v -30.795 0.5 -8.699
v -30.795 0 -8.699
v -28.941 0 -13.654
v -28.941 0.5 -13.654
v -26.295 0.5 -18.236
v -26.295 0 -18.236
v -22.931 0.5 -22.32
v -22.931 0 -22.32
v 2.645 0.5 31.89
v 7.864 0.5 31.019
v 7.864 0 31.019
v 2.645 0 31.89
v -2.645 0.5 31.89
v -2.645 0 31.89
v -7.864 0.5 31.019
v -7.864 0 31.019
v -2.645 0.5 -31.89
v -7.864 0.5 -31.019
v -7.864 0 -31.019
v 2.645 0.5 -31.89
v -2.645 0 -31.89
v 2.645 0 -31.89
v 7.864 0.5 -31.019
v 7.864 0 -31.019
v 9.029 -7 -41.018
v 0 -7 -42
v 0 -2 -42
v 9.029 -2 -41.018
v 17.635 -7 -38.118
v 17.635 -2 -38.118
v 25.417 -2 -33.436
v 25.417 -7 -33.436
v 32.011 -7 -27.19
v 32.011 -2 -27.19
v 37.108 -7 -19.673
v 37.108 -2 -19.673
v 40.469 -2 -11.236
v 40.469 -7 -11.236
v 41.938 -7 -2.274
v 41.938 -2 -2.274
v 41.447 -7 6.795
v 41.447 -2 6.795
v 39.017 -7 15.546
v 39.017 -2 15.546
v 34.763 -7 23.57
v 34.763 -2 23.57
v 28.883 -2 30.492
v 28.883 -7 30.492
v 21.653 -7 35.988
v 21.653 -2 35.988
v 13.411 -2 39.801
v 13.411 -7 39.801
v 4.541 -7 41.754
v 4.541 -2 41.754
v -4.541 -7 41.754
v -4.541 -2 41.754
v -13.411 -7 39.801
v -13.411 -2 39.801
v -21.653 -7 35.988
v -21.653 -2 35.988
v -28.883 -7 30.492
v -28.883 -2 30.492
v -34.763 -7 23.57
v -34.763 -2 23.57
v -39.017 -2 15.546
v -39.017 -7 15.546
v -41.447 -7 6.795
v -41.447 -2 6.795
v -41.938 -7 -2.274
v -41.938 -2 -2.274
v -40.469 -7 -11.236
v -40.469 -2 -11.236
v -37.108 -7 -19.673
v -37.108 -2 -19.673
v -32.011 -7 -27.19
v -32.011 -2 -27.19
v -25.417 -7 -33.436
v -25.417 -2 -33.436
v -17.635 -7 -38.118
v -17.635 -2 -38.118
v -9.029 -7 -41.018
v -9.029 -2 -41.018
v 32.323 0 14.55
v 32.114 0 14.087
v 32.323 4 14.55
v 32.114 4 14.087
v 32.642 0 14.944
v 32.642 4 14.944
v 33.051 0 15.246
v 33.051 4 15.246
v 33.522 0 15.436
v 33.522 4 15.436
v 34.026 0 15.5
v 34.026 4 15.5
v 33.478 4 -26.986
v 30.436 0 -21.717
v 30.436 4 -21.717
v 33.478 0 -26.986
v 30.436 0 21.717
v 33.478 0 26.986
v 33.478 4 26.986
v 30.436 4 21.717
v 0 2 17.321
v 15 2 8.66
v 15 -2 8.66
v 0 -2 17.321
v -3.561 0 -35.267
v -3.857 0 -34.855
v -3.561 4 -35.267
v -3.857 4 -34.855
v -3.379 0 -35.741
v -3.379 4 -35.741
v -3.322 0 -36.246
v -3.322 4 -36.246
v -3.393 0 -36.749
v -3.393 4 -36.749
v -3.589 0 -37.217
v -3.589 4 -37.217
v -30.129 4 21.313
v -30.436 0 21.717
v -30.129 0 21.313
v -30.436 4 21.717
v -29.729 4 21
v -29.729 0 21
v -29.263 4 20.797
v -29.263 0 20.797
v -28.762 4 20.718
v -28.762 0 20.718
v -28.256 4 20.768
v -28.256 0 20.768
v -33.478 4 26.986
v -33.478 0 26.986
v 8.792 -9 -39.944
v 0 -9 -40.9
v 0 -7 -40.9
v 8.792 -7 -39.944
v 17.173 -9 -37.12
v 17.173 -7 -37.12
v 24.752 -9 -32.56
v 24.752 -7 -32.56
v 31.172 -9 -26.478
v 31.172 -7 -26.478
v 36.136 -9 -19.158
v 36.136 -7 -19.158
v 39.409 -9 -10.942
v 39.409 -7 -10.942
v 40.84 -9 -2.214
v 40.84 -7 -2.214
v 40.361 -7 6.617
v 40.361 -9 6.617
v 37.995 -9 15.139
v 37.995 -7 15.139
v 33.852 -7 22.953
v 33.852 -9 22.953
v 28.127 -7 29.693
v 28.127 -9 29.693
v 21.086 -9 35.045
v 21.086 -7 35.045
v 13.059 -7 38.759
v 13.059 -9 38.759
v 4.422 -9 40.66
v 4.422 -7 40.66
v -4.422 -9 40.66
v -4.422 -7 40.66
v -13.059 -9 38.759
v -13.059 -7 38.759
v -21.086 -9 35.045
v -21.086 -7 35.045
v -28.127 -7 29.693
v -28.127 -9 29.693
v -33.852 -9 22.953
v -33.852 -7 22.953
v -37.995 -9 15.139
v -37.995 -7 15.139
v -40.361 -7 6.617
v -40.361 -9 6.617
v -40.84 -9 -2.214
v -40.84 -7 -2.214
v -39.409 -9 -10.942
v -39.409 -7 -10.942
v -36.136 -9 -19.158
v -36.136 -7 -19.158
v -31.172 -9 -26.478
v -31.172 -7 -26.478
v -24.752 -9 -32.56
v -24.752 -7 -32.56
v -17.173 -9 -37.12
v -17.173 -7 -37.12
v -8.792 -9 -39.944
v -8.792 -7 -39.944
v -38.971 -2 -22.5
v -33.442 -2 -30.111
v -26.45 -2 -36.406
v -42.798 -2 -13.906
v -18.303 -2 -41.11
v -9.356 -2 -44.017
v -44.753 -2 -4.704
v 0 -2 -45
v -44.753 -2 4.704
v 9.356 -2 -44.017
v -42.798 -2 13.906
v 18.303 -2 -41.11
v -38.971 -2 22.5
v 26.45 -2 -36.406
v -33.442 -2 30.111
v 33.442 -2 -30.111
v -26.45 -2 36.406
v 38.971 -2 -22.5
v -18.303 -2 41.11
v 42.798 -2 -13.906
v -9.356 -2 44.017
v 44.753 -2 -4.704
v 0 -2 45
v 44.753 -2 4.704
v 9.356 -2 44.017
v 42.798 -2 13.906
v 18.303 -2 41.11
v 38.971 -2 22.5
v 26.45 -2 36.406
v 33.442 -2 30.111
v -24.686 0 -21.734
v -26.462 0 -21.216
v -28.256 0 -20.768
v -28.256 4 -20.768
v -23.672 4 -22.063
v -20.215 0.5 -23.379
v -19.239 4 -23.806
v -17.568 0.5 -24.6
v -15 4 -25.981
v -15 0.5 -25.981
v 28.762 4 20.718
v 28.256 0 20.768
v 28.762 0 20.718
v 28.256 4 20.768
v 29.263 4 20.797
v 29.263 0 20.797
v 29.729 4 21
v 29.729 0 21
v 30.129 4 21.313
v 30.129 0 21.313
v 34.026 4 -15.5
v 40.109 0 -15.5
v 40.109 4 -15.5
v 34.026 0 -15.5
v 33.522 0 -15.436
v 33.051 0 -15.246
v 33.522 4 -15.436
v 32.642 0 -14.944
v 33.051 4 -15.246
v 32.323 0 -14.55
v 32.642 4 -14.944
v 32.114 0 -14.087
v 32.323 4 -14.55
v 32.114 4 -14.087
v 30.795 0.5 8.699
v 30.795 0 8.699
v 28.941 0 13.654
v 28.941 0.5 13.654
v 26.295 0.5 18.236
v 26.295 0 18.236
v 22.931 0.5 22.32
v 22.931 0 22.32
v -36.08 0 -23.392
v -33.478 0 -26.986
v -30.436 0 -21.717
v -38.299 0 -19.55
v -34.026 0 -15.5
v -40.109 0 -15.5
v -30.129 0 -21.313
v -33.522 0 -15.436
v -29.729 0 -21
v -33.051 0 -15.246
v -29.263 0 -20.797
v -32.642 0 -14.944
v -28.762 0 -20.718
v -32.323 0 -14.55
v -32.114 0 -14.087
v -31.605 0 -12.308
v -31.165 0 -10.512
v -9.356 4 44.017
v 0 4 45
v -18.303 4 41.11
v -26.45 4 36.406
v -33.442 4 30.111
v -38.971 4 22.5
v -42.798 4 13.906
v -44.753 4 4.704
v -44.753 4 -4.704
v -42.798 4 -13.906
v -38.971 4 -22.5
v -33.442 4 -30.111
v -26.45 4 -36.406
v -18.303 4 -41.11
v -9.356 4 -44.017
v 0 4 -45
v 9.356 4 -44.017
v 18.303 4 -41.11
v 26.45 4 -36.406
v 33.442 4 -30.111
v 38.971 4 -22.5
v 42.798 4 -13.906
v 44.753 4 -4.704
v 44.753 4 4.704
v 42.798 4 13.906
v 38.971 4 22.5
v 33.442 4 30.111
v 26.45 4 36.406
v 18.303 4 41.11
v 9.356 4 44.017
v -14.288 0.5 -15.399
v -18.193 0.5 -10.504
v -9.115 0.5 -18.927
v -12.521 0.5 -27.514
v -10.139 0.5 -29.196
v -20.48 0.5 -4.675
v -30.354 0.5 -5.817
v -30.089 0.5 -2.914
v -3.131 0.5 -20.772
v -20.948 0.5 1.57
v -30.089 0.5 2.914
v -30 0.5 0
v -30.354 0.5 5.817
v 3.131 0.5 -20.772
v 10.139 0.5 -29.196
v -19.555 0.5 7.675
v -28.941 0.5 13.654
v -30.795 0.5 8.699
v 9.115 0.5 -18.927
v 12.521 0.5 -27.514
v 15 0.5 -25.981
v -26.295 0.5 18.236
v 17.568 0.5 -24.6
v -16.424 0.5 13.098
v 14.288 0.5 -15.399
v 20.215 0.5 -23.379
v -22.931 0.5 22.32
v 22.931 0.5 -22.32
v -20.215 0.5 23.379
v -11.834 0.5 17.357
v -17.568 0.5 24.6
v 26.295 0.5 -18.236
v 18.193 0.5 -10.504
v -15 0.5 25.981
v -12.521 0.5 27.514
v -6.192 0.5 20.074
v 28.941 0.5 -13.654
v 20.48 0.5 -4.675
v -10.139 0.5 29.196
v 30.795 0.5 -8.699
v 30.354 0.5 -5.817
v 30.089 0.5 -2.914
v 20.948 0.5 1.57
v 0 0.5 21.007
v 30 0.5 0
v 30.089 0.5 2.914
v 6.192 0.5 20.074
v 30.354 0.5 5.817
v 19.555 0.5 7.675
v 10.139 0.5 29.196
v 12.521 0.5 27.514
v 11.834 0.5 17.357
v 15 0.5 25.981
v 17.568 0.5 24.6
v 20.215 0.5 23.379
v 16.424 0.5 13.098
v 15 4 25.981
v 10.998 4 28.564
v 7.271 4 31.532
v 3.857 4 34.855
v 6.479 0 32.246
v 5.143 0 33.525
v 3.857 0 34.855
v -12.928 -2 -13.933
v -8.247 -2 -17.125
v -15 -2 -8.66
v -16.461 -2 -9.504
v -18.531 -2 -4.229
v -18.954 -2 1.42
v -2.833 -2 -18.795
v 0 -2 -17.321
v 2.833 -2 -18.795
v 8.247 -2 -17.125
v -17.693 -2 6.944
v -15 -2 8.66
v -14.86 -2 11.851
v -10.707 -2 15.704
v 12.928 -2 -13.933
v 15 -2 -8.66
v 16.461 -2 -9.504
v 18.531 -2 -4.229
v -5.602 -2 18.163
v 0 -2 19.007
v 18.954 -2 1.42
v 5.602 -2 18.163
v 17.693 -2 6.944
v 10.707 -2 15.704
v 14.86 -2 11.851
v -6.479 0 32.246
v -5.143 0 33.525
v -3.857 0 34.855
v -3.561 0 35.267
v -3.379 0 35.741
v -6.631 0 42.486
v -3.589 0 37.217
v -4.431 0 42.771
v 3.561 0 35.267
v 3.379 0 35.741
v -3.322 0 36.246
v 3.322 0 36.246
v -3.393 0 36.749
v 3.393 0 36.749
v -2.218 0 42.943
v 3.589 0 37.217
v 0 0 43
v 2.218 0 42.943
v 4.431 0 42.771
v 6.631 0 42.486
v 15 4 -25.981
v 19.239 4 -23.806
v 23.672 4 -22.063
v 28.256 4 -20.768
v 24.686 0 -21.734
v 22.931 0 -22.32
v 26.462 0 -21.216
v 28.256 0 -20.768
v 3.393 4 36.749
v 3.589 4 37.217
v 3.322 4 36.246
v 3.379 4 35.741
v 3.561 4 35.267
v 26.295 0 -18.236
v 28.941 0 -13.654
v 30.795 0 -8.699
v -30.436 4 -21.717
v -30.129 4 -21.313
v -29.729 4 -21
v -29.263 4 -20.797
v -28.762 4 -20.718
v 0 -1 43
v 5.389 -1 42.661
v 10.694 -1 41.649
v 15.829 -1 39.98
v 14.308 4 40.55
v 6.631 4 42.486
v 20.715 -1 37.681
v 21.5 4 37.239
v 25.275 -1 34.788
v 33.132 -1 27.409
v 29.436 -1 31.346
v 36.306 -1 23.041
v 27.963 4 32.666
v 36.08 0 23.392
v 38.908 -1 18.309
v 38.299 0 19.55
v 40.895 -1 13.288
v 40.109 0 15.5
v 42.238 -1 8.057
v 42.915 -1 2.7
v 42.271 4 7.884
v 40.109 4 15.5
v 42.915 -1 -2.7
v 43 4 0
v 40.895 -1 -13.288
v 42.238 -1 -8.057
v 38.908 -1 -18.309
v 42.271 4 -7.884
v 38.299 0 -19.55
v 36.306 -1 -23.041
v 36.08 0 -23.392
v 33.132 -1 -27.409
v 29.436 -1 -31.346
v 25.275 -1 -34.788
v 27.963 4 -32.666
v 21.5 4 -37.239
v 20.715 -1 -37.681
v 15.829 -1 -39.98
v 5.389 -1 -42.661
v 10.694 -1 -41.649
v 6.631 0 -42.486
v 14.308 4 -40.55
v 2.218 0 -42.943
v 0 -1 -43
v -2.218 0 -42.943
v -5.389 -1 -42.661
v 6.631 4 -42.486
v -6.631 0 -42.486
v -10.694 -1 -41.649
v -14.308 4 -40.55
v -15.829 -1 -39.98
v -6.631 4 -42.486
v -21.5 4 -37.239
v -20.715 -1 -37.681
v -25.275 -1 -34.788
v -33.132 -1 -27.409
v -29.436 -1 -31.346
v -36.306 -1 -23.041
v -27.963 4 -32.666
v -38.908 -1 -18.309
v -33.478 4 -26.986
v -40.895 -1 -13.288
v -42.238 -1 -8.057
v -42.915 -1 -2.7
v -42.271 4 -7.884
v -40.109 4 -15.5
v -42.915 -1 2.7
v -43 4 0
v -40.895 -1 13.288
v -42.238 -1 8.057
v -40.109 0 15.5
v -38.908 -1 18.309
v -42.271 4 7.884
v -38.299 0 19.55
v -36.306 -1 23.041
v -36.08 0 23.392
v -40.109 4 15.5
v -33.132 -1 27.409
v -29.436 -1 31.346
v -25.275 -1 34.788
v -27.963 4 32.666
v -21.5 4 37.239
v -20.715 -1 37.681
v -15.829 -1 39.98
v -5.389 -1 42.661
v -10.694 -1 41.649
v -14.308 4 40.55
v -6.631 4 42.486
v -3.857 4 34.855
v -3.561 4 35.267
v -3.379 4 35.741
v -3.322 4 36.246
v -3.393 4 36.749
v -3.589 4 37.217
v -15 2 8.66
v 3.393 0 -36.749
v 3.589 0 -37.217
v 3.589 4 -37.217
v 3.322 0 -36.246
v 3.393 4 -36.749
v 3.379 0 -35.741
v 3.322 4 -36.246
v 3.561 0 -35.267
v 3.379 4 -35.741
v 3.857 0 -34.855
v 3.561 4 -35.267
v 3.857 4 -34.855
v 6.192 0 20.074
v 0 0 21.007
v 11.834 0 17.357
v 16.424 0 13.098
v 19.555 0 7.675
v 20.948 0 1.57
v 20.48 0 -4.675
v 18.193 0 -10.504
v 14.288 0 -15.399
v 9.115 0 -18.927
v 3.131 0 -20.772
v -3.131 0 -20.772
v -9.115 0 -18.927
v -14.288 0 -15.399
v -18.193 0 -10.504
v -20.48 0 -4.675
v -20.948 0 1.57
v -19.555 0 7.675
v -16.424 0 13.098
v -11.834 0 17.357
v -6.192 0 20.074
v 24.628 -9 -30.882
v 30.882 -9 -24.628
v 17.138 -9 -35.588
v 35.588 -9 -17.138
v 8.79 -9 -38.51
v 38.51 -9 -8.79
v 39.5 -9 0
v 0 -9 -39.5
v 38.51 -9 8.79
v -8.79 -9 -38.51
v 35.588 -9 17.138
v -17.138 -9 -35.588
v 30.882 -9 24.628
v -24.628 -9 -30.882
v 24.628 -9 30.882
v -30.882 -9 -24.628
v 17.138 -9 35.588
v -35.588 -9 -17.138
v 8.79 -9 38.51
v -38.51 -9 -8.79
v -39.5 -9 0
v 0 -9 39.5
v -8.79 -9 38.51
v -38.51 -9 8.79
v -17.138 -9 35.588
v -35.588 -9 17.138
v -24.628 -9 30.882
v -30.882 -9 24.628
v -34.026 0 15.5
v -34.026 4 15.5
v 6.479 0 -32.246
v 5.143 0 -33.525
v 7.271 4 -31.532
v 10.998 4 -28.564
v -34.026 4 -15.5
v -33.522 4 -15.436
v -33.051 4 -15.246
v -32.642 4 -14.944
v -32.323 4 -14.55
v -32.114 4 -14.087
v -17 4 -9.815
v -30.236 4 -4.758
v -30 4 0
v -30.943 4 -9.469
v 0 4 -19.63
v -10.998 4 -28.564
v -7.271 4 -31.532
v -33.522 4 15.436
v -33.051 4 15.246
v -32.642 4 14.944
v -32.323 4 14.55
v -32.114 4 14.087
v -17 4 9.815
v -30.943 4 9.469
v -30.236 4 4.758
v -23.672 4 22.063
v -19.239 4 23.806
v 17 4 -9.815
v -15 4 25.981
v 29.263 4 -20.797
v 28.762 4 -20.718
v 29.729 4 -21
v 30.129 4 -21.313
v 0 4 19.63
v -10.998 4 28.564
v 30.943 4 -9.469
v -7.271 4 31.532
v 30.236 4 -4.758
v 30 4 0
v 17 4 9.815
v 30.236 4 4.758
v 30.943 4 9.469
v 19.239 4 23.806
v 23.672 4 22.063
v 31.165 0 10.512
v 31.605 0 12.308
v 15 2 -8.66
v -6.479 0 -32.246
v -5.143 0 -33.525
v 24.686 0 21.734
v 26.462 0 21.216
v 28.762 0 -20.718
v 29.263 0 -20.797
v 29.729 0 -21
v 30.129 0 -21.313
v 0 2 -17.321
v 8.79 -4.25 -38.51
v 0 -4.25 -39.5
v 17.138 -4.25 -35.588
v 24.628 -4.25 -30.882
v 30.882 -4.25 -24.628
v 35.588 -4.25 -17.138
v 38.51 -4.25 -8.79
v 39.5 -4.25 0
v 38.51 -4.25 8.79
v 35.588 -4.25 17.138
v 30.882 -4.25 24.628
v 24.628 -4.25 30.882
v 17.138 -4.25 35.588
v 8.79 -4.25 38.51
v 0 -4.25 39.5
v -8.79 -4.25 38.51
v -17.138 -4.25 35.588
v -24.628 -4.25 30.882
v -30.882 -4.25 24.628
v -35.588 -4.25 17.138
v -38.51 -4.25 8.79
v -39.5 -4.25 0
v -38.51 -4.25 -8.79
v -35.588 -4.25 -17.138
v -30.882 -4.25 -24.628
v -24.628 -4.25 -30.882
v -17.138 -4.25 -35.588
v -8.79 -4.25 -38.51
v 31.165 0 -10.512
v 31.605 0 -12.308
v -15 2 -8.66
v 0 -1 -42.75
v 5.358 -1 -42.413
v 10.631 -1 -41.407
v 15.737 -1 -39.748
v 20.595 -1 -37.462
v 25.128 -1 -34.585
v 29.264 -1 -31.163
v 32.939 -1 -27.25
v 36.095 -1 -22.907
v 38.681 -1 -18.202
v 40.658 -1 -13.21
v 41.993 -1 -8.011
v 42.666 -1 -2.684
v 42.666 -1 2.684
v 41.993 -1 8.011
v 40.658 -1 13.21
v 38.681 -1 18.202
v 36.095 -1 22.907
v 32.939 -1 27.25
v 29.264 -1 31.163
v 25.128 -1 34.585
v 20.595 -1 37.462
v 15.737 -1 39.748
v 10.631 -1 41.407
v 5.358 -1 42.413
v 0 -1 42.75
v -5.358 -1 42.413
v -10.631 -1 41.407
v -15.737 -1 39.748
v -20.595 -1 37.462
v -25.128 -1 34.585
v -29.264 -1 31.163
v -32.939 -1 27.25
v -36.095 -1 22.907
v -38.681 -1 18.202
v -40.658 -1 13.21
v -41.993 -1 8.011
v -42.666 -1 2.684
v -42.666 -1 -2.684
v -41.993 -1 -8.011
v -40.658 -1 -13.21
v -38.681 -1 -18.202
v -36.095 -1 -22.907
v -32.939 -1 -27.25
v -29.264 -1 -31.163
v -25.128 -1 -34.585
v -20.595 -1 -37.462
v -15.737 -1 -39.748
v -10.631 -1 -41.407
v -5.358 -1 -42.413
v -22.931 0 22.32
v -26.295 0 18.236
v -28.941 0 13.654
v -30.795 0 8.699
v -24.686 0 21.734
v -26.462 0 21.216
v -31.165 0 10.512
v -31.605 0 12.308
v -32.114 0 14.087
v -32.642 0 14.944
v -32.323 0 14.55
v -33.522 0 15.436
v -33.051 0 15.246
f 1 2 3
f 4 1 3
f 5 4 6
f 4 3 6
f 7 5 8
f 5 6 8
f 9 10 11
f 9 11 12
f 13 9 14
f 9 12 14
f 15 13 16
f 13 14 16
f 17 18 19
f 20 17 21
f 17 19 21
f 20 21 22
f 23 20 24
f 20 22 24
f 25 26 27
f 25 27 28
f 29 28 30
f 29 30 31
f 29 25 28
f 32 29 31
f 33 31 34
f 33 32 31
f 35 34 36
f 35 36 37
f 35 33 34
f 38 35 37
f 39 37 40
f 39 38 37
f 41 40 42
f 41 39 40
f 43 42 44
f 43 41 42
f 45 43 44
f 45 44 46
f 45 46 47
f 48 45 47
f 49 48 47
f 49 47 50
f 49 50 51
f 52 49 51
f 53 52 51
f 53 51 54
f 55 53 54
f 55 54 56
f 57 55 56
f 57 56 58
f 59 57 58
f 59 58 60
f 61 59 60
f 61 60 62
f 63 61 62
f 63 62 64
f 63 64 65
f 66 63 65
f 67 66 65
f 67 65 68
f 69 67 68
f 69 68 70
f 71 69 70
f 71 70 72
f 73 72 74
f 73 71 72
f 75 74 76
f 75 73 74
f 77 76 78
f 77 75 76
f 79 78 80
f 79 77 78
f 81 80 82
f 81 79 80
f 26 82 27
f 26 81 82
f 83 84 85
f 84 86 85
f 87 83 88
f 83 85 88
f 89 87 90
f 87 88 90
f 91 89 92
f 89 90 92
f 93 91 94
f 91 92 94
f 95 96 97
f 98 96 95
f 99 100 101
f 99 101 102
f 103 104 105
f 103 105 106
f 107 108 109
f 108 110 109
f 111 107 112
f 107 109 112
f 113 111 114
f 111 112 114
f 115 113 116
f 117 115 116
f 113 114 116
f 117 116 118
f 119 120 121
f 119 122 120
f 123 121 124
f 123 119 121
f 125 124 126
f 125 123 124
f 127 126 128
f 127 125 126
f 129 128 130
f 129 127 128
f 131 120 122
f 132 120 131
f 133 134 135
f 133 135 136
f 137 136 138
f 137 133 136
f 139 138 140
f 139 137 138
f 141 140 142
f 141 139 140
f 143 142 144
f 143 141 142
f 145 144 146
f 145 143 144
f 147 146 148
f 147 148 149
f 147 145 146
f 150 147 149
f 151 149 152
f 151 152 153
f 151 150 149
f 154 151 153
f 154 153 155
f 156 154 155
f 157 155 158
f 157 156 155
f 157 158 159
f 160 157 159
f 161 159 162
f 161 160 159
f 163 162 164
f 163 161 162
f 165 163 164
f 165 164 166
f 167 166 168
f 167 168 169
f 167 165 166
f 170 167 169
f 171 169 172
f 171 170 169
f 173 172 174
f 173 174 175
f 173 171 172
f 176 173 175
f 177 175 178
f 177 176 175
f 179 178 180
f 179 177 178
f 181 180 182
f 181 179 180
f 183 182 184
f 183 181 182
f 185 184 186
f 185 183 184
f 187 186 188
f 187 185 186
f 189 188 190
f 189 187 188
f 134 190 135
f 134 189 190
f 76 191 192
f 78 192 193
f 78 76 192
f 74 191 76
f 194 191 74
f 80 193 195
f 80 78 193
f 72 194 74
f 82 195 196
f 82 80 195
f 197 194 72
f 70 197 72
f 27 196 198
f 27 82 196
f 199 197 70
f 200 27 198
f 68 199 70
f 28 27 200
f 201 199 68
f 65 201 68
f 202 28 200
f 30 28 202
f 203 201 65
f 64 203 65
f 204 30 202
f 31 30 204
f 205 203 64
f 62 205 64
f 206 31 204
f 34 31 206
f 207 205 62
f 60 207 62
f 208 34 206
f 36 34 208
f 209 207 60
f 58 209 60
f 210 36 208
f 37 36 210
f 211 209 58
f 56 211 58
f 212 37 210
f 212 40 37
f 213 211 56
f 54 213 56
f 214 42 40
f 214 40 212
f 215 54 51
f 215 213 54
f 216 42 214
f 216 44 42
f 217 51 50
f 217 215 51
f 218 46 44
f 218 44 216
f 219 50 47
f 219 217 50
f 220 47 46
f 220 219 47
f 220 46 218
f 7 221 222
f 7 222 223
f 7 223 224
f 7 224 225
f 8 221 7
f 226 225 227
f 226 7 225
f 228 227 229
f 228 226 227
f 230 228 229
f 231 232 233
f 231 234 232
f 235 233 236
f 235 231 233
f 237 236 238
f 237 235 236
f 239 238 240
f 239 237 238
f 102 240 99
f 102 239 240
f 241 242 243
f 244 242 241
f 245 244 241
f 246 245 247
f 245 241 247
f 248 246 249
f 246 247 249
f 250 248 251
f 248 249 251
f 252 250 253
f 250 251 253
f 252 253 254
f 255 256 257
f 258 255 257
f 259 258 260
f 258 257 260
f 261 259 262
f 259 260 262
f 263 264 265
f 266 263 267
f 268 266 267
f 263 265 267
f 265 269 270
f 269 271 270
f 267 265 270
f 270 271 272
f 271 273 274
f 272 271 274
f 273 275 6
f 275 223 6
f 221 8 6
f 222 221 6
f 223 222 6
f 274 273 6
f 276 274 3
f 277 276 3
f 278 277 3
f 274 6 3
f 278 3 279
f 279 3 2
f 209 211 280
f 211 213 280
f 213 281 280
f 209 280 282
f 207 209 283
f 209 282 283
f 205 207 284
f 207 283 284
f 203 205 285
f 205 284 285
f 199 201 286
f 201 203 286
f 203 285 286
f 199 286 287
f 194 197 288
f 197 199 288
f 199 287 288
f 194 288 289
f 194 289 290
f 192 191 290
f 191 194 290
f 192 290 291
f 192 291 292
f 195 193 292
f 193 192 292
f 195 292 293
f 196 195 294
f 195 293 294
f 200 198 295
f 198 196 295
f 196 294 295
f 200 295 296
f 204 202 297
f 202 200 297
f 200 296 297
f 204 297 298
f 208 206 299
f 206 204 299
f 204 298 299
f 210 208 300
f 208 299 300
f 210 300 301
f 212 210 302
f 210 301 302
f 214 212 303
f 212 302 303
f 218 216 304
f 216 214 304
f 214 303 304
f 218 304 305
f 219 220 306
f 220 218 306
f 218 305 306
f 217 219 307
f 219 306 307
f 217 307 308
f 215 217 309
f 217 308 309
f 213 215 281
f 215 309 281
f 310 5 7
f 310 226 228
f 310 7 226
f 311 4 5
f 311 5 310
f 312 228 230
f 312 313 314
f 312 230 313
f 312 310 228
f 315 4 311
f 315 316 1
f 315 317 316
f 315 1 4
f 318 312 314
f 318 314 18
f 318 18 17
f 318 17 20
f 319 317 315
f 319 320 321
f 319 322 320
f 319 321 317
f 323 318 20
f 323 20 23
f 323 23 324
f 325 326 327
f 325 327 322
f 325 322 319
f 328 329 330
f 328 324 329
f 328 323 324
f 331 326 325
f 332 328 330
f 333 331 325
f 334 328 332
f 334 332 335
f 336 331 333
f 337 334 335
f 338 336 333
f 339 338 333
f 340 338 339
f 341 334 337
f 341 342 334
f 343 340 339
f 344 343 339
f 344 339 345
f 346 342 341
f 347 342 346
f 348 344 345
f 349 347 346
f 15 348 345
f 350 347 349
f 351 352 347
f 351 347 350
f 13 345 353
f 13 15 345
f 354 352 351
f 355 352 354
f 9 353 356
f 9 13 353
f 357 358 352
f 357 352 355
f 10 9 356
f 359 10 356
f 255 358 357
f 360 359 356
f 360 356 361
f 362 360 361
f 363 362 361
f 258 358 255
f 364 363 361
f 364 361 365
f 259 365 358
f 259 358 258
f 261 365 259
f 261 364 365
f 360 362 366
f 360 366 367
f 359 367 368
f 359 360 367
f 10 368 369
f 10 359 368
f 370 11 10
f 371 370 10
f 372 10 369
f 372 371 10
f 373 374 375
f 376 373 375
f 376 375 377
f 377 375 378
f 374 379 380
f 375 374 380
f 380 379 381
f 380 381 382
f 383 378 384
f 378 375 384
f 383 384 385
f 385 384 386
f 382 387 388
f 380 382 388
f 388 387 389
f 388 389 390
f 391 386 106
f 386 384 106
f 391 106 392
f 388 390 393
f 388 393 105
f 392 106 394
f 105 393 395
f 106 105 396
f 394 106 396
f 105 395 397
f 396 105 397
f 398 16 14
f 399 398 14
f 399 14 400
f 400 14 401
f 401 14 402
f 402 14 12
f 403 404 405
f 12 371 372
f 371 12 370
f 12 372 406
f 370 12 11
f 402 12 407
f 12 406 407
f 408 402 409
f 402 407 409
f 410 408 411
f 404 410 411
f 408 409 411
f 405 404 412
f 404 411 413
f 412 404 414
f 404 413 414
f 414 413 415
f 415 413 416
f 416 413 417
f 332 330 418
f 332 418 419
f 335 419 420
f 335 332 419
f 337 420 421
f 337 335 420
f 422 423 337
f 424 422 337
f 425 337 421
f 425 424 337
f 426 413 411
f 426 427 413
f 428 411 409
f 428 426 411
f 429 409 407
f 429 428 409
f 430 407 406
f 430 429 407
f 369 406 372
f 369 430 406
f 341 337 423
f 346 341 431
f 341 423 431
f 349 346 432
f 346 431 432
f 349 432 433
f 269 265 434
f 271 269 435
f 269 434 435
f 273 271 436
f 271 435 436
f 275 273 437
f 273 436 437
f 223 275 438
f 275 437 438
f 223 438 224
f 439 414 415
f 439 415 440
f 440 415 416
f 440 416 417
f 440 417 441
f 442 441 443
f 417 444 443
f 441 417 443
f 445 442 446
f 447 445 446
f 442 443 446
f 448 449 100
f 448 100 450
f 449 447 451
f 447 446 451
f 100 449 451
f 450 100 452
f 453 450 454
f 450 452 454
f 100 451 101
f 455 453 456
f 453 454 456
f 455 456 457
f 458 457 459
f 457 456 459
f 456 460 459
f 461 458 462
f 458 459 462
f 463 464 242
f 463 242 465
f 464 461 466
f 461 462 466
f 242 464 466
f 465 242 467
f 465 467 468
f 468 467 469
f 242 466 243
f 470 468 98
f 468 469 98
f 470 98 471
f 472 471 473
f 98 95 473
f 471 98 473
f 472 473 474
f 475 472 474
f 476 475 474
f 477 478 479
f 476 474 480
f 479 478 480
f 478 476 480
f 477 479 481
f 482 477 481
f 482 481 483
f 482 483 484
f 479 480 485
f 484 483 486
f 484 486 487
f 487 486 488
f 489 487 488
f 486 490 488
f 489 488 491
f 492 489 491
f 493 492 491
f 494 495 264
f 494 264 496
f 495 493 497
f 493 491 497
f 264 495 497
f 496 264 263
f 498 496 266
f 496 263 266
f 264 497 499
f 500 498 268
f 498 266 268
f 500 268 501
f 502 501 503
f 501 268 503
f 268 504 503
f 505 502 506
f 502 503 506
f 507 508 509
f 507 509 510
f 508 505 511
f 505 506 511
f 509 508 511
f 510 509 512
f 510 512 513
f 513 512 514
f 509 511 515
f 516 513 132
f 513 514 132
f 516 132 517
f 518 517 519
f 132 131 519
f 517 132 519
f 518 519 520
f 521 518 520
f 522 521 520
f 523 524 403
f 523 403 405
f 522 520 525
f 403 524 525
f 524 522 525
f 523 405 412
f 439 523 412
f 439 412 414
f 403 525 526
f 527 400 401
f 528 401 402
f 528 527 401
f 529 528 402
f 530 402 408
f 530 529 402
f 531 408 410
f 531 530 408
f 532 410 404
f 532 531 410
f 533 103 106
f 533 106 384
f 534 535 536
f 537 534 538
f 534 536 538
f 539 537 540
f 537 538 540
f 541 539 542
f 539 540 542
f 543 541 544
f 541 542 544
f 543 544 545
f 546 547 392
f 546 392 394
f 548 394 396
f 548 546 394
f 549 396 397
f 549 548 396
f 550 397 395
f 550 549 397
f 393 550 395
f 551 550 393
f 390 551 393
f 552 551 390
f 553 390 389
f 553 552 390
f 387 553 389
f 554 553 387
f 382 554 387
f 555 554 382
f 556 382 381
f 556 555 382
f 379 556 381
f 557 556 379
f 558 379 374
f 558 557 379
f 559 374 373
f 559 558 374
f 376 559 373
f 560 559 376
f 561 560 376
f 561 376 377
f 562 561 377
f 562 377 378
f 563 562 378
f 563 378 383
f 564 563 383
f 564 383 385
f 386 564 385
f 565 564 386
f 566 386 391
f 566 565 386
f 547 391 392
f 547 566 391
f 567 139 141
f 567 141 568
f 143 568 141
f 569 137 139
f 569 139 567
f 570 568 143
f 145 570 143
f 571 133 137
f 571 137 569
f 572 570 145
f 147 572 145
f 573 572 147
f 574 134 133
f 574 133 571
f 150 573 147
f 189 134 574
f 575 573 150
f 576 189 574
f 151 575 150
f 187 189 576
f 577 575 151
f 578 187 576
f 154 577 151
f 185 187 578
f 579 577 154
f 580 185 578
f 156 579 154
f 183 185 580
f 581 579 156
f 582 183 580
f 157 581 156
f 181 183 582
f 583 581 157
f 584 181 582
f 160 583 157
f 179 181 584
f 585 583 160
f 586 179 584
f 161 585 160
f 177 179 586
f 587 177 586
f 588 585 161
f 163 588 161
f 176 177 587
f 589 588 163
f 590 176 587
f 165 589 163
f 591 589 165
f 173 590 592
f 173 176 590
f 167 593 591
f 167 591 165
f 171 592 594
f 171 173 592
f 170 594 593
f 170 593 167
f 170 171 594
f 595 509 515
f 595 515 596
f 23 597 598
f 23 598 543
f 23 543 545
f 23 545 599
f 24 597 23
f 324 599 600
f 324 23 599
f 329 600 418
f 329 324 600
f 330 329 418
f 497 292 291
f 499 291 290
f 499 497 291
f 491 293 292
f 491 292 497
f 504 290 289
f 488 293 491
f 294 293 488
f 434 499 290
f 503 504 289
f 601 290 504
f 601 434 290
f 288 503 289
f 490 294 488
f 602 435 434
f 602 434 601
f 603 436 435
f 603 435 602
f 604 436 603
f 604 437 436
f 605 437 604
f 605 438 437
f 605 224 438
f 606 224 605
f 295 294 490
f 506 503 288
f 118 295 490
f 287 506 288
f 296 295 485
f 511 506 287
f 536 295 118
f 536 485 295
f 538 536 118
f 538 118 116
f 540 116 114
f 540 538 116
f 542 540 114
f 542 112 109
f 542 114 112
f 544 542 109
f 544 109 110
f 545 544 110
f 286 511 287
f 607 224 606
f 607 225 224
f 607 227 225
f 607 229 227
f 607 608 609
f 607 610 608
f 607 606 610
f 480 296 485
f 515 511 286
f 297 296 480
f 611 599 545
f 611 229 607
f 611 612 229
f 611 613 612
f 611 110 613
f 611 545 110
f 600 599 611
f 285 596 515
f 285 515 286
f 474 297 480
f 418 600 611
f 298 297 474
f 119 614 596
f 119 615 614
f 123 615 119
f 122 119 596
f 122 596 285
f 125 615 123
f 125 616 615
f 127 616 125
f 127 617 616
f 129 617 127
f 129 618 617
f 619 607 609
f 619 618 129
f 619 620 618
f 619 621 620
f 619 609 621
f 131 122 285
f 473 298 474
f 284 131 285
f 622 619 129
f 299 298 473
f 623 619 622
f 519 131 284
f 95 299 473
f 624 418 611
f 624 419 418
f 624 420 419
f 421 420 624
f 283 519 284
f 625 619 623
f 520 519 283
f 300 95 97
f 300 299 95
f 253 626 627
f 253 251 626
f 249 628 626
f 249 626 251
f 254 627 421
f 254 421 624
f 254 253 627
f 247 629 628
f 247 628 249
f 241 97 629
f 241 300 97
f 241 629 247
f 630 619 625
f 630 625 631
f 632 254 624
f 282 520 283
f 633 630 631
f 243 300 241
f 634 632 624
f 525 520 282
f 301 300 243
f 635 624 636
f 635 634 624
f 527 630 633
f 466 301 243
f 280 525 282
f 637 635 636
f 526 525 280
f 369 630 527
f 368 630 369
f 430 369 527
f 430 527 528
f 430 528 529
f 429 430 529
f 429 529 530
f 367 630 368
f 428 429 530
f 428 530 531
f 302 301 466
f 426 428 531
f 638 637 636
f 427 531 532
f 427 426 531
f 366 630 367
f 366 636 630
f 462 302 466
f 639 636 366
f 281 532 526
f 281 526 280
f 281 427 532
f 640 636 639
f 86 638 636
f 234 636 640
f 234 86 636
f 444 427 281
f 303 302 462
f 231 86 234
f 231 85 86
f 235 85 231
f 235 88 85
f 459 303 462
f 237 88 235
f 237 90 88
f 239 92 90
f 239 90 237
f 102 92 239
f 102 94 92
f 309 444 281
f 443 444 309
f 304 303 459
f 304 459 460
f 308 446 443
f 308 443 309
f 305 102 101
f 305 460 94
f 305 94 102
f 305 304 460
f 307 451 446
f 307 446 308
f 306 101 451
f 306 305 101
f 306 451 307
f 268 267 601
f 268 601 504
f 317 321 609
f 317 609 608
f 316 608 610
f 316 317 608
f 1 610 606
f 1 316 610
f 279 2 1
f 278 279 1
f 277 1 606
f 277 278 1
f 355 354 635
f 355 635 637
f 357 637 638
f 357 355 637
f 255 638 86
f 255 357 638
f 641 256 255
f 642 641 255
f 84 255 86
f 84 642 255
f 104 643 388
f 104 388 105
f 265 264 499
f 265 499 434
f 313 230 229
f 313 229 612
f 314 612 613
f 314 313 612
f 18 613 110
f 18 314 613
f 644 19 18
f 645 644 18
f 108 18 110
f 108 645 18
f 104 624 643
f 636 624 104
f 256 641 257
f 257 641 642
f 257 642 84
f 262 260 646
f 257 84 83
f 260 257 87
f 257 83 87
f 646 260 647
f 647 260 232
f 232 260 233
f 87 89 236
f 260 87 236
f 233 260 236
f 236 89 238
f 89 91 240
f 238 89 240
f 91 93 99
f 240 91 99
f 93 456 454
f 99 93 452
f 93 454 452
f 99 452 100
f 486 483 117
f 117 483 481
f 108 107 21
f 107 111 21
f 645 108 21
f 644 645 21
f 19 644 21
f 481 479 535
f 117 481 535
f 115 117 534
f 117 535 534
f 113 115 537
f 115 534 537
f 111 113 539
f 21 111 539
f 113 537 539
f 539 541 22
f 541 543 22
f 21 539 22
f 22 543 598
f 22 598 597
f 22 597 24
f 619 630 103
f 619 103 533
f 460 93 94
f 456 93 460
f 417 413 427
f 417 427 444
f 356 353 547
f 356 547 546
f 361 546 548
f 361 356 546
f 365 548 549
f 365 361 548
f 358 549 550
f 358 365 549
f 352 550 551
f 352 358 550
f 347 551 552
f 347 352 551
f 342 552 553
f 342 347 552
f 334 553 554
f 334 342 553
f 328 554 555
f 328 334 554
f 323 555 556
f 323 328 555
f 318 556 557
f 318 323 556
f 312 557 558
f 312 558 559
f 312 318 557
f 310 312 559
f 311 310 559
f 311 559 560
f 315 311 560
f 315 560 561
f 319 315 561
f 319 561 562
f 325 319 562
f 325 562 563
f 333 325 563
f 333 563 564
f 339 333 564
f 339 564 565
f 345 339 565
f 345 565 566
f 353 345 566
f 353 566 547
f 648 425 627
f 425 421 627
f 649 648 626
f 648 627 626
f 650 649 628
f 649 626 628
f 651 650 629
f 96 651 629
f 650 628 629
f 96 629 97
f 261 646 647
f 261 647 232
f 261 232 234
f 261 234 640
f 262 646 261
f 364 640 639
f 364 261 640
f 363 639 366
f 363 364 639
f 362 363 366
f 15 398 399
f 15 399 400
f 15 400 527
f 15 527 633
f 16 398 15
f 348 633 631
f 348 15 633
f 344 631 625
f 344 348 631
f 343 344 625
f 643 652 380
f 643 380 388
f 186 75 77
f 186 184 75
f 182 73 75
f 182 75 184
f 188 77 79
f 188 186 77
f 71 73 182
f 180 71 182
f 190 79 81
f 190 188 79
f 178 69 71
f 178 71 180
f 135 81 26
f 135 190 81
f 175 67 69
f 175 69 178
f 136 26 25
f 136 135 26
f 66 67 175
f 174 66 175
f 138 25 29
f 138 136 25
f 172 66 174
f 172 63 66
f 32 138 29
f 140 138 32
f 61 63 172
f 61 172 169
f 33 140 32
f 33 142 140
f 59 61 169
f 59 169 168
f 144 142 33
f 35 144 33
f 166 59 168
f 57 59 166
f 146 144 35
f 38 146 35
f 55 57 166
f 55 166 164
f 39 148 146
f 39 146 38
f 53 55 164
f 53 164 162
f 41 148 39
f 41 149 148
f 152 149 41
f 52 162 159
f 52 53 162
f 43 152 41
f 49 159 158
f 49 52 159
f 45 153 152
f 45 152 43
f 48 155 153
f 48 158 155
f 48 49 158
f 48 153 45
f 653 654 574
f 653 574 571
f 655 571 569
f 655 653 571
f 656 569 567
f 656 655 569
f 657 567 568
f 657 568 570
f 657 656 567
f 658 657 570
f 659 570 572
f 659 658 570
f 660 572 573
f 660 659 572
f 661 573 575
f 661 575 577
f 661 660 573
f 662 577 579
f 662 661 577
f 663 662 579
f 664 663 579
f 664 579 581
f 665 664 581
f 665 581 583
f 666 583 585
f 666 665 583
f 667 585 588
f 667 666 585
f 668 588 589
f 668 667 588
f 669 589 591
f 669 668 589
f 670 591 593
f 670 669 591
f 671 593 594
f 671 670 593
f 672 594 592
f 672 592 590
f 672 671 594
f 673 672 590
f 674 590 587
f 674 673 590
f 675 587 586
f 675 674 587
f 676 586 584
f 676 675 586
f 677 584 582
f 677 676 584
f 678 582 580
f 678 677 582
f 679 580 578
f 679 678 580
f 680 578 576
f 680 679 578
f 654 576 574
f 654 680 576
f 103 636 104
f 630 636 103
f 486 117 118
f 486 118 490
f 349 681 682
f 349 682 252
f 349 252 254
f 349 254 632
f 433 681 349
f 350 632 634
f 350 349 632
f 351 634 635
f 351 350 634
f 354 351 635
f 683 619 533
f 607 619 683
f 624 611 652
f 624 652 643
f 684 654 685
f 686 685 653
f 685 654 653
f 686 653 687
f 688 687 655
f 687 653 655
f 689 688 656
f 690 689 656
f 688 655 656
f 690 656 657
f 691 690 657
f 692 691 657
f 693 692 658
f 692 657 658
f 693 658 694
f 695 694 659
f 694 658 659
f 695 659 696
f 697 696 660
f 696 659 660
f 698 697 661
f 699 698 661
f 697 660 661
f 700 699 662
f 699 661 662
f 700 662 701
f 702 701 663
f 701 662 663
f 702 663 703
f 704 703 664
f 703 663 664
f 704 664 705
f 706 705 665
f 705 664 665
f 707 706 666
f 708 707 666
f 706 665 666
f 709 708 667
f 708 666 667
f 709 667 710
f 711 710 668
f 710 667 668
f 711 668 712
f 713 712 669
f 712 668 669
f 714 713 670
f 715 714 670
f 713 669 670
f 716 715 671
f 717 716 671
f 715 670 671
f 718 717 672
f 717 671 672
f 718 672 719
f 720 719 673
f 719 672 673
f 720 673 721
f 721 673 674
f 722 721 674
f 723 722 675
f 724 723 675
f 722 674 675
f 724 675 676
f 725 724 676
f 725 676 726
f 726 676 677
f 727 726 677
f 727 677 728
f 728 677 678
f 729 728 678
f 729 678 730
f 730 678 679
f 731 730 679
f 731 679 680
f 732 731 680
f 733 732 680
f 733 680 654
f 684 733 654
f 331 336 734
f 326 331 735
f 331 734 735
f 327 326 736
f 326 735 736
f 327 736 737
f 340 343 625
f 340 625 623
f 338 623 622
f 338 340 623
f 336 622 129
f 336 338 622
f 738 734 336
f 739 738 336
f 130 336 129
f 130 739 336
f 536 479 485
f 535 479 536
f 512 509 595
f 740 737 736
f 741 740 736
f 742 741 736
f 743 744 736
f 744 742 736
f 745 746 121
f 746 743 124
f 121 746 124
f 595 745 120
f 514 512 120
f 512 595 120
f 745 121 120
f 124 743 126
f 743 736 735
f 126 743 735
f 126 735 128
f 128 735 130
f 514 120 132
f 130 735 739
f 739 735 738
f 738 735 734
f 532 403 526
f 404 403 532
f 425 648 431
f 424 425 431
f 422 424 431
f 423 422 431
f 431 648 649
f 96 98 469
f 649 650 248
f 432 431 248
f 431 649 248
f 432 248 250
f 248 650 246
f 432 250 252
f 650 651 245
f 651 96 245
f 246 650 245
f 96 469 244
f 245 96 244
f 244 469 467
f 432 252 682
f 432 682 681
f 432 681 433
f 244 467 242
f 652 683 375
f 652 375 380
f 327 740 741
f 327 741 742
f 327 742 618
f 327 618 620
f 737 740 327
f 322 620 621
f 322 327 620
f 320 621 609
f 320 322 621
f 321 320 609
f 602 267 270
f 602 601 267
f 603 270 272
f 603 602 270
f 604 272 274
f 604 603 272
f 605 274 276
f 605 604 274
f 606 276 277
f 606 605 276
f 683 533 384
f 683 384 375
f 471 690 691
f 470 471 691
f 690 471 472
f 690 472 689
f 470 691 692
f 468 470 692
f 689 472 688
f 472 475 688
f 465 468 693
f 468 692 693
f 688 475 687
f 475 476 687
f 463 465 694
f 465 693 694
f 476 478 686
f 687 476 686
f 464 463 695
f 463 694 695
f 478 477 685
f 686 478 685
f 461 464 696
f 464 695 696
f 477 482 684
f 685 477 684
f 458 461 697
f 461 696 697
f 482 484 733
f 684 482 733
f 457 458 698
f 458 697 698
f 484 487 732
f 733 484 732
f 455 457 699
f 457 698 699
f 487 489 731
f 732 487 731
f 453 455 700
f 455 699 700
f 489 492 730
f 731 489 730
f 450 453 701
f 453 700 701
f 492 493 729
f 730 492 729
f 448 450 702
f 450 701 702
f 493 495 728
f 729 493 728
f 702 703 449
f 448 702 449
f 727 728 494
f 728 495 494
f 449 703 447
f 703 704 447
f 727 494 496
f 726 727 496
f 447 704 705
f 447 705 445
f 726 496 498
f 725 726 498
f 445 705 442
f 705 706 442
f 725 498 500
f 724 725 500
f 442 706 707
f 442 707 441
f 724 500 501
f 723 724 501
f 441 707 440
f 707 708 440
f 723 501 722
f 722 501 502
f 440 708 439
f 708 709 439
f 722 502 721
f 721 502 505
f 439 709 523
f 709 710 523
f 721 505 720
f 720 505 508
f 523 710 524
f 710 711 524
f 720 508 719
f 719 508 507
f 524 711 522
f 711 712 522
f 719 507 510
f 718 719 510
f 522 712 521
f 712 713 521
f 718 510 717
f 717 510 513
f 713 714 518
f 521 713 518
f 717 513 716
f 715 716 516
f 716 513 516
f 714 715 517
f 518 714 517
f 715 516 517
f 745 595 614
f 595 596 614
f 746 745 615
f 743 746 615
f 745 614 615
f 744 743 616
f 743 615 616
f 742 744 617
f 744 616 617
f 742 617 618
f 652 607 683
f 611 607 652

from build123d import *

# Parameters (mm, degrees)
SKIZZE1_R                             = 44
AUFSATZ_LINEAR_AUSTRAGEN1_DEPTH       = 4
SCHNITT_LINEAR_START                  = -10
SCHNITT_LINEAR_AUSTRAGEN2_DEPTH       = 10
KREISMUSTER1_COUNT                    = 6
SCHNITT_LINEAR_AUSTRAGEN3_DEPTH       = 4
SCHNITT_LINEAR_AUSTRAGEN3_DEPTH_BACK  = 10
VERRUNDUNG1_R                         = 2
SKIZZE7_R                             = 32
SCHNITT_LINEAR_AUSTRAGEN7_DEPTH       = 0.5
SKIZZE8_R                             = 45
SKIZZE8_R_2                           = 43
AUFSATZ_LINEAR_AUSTRAGEN2_DEPTH       = 5
SKIZZE9_R                             = 45
SKIZZE9_R_2                           = 39.5
AUFSATZ_LINEAR_AUSTRAGEN3_DEPTH       = 8
SKIZZE4_R                             = 21.007106764
AUFSATZ_LINEAR_AUSTRAGEN8_DEPTH       = 6
FASE1_SIZE                            = 3.25
SKIZZE10_R                            = 50
SKIZZE10_R_2                          = 42
SCHNITT_LINEAR_AUSTRAGEN9_DEPTH       = 7
SKIZZE11_R                            = 50
SKIZZE11_R_2                          = 40.9
SCHNITT_LINEAR_AUSTRAGEN10_DEPTH      = 2
SCHNITT_LINEAR_AUSTRAGEN11_DEPTH      = 6
SCHNITT_LINEAR_AUSTRAGEN11_DEPTH_BACK = 6
FASE3_SIZE                            = 2
FASE5_SIZE                            = 2


with BuildPart() as part:
    # Skizze1 → Aufsatz-Linear austragen1 (new body)
    with BuildSketch(Plane(origin=(0, 0, 0), x_dir=(1, 0, 0), z_dir=(0, 1, 0))):
        Circle(SKIZZE1_R)
    extrude(amount=AUFSATZ_LINEAR_AUSTRAGEN1_DEPTH)

    # Skizze2 → Schnitt-Linear austragen2 (cut)
    with BuildSketch(Plane(origin=(0, 4, 0), x_dir=(1, 0, 0), z_dir=(0, 1, 0)).offset(SCHNITT_LINEAR_START)):
        with BuildLine():
            ThreePointArc((-30, 0), (-30.647234858, 7.855929826), (-32.571484726, 15.5))
            Line((-32.571484726, 15.5), (-41.179485184, 15.5))
            ThreePointArc((-41.179485184, 15.5), (-44, 0), (-41.179485184, -15.5))
            Line((-41.179485184, -15.5), (-32.571484726, -15.5))
            ThreePointArc((-32.571484726, -15.5), (-30.647234858, -7.855929826), (-30, 0))
        make_face()
    schnitt_linear_austragen2 = extrude(amount=SCHNITT_LINEAR_AUSTRAGEN2_DEPTH, mode=Mode.SUBTRACT)

    # Kreismuster1: Schnitt-Linear austragen2 ×6 about axis
    kreismuster1_axis = Axis((0, 0, 0), (0, 1, 0))
    for i in range(1, KREISMUSTER1_COUNT):
        add(schnitt_linear_austragen2.rotate(kreismuster1_axis, i * 360 / KREISMUSTER1_COUNT), mode=Mode.SUBTRACT)

    # Skizze3 → Schnitt-Linear austragen3 (cut, two sides: drawn at the far end of the back side and taken through both)
    with BuildSketch(Plane.XZ.offset(-SCHNITT_LINEAR_AUSTRAGEN3_DEPTH_BACK)):
        Polygon((15, 8.660254038), (0, 17.320508076), (-15, 8.660254038), (-15, -8.660254038), (0, -17.320508076), (15, -8.660254038), align=None)
    extrude(amount=SCHNITT_LINEAR_AUSTRAGEN3_DEPTH + SCHNITT_LINEAR_AUSTRAGEN3_DEPTH_BACK, mode=Mode.SUBTRACT)

    # Verrundung1
    verrundung1_edges = [part.edges().sort_by_distance(p)[0] for p in [
        (-32.571484726, 2, 15.5),
        (-2.862348604, 2, 35.957733212),
        (2.862348604, 2, 35.957733212),
        (29.709136122, 2, 20.457733212),
        (32.571484726, 2, 15.5),
        (32.571484726, 2, -15.5),
        (29.709136122, 2, -20.457733212),
        (2.862348604, 2, -35.957733212),
        (-2.862348604, 2, -35.957733212),
        (-29.709136122, 2, -20.457733212),
        (-32.571484726, 2, -15.5),
        (-29.709136122, 2, 20.457733212),
    ]]
    fillet(verrundung1_edges, radius=VERRUNDUNG1_R)

    # Skizze7 → Schnitt-Linear austragen7 (cut)
    with BuildSketch(Plane.XZ):
        Circle(SKIZZE7_R)
    extrude(amount=-SCHNITT_LINEAR_AUSTRAGEN7_DEPTH, mode=Mode.SUBTRACT)

    # Skizze8 → Aufsatz-Linear austragen2 (add)
    with BuildSketch(Plane(origin=(0, 4, 0), x_dir=(1, 0, 0), z_dir=(0, 1, 0))):
        Circle(SKIZZE8_R)
        Circle(SKIZZE8_R_2, mode=Mode.SUBTRACT)
    extrude(amount=-AUFSATZ_LINEAR_AUSTRAGEN2_DEPTH)



with BuildPart() as body_2:
    # Skizze9 → Aufsatz-Linear austragen3 (new body)
    with BuildSketch(Plane.XZ.offset(1)):
        Circle(SKIZZE9_R)
        Circle(SKIZZE9_R_2, mode=Mode.SUBTRACT)
    extrude(amount=AUFSATZ_LINEAR_AUSTRAGEN3_DEPTH)


with BuildPart() as part_1:
    add(part.part)

    add(body_2.part)  # Aufsatz-Linear austragen8 merges body 2
    # Skizze4 → Aufsatz-Linear austragen8 (add)
    with BuildSketch(Plane(origin=(0, 4, 0), x_dir=(1, 0, 0), z_dir=(0, 1, 0))):
        Circle(SKIZZE4_R)
    extrude(amount=-AUFSATZ_LINEAR_AUSTRAGEN8_DEPTH)

    # Fase1
    fase1_edges = [part_1.edges().sort_by_distance(p)[0] for p in [
        (-39.5, -1, 0),
    ]]
    chamfer(fase1_edges, length=FASE1_SIZE)

    # Skizze10 → Schnitt-Linear austragen9 (cut)
    with BuildSketch(Plane.XZ.offset(9)):
        Circle(SKIZZE10_R)
        Circle(SKIZZE10_R_2, mode=Mode.SUBTRACT)
    extrude(amount=-SCHNITT_LINEAR_AUSTRAGEN9_DEPTH, mode=Mode.SUBTRACT)

    # Skizze11 → Schnitt-Linear austragen10 (cut)
    with BuildSketch(Plane.XZ.offset(9)):
        with Locations((-1.948563864, 1.772578218)):
            Circle(SKIZZE11_R)
        Circle(SKIZZE11_R_2, mode=Mode.SUBTRACT)
    extrude(amount=-SCHNITT_LINEAR_AUSTRAGEN10_DEPTH, mode=Mode.SUBTRACT)

    # Skizze3<3> → Schnitt-Linear austragen11 (cut, two sides: drawn at the far end of the back side and taken through both)
    with BuildSketch(Plane.XZ.offset(-SCHNITT_LINEAR_AUSTRAGEN11_DEPTH_BACK)):
        Polygon((15, 8.660254038), (0, 17.320508076), (-15, 8.660254038), (-15, -8.660254038), (0, -17.320508076), (15, -8.660254038), align=None)
    extrude(amount=SCHNITT_LINEAR_AUSTRAGEN11_DEPTH + SCHNITT_LINEAR_AUSTRAGEN11_DEPTH_BACK, mode=Mode.SUBTRACT)

    # Fase3
    fase3_edges = [part_1.edges().sort_by_distance(p)[0] for p in [
        (-21.007106764, -2, 0),
    ]]
    chamfer(fase3_edges, length=FASE3_SIZE)

    # Fase5
    fase5_edges = [part_1.edges().sort_by_distance(p)[0] for p in [
        (-7.5, 4, 12.990381057),
        (7.5, 4, 12.990381057),
        (15, 4, 0),
        (7.5, 4, -12.990381057),
        (-7.5, 4, -12.990381057),
        (-15, 4, 0),
    ]]
    chamfer(fase5_edges, length=FASE5_SIZE)


solid = part_1.part
